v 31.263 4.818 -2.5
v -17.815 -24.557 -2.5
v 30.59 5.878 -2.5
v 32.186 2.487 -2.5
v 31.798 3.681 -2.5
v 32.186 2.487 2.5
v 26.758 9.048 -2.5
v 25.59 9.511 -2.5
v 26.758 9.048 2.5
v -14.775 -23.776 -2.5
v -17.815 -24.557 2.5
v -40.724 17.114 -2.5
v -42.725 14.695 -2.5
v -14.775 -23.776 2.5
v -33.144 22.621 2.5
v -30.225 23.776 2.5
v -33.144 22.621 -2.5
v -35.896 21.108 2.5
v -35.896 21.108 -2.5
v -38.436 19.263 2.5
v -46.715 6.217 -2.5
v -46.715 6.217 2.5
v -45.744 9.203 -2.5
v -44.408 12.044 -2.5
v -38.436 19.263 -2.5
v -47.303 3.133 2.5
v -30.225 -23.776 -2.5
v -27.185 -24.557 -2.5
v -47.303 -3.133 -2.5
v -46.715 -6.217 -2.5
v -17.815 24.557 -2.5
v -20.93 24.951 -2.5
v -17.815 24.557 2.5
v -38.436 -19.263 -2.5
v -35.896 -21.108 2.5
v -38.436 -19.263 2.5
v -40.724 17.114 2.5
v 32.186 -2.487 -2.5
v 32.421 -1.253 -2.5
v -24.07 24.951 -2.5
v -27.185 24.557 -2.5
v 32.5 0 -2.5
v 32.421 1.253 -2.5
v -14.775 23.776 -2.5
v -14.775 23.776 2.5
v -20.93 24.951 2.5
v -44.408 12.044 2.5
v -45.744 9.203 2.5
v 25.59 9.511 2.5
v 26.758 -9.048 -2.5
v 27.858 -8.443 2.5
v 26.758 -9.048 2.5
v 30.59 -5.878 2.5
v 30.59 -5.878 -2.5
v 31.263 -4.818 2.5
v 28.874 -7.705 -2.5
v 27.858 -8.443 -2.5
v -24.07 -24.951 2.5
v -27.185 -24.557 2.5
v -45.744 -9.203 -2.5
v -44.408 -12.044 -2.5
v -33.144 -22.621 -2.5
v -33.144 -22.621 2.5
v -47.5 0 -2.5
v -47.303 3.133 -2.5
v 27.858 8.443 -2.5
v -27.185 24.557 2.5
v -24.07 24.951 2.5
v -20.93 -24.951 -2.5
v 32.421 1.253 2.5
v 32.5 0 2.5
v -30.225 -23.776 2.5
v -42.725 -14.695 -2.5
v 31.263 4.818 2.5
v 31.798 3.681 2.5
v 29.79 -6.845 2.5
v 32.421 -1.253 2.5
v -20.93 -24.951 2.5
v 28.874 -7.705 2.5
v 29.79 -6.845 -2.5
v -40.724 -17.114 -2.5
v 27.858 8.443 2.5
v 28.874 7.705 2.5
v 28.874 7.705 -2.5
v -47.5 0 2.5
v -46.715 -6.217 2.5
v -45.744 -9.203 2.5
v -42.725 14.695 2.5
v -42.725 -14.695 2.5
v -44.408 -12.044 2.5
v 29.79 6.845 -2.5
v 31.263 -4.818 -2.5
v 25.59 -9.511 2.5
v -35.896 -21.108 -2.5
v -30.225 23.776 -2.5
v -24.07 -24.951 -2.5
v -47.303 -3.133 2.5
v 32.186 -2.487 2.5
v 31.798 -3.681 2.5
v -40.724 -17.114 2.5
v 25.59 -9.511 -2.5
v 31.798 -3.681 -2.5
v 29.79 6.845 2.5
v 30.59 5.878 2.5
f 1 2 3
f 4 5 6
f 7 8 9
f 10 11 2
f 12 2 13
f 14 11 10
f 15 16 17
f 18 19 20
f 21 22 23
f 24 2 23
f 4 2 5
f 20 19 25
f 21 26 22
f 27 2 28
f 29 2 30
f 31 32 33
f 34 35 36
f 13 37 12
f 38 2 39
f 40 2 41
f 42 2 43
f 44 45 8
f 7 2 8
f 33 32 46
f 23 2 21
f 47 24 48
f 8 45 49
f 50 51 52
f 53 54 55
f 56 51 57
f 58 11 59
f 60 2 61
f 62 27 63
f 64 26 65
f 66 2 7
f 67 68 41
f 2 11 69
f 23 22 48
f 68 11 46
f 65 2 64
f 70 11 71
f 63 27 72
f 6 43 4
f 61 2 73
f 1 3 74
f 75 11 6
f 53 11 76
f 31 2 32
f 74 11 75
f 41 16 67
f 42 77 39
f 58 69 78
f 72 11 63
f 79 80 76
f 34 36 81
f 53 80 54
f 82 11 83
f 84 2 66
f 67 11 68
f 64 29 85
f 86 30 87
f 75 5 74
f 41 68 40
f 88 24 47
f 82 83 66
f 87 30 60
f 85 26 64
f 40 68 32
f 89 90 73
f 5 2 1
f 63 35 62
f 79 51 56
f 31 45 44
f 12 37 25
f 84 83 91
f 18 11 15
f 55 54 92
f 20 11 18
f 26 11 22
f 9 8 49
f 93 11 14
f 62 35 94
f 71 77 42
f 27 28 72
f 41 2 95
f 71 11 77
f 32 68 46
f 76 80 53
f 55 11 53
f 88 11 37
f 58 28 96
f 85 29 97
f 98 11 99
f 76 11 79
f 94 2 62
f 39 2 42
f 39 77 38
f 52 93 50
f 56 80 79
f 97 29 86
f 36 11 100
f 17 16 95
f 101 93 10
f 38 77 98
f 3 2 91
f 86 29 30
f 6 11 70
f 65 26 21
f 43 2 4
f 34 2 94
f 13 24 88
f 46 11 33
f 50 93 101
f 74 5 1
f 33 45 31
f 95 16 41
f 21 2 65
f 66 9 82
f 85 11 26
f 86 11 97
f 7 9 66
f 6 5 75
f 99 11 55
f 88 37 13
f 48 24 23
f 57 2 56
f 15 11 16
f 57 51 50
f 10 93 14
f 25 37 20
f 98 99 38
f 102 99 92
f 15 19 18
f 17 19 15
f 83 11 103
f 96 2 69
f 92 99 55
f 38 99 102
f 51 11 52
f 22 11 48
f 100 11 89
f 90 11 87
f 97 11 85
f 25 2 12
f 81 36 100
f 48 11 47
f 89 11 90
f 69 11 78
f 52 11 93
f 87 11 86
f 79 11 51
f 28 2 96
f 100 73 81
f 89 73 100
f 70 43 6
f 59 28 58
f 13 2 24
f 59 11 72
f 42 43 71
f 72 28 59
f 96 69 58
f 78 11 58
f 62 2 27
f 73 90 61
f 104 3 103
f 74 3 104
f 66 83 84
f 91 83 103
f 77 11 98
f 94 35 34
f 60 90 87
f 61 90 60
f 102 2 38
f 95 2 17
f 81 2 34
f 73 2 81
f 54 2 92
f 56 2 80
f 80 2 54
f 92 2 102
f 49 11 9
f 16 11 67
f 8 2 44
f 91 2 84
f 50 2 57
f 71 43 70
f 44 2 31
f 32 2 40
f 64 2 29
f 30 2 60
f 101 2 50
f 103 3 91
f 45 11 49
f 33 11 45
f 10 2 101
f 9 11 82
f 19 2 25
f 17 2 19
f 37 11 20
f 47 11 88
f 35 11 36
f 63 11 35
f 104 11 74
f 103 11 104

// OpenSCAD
r1 = 25;
r2 = 10;
th = 5;

distancia = r1 + r2 + 10;


hull(){
translate([-distancia/2,0,0])
	
	cylinder(r=r1,h=th,$fn=50,center=true);

translate([distancia/2,0,0])
	
	cylinder(r=r2,h=th,$fn=50,center=true);

}
